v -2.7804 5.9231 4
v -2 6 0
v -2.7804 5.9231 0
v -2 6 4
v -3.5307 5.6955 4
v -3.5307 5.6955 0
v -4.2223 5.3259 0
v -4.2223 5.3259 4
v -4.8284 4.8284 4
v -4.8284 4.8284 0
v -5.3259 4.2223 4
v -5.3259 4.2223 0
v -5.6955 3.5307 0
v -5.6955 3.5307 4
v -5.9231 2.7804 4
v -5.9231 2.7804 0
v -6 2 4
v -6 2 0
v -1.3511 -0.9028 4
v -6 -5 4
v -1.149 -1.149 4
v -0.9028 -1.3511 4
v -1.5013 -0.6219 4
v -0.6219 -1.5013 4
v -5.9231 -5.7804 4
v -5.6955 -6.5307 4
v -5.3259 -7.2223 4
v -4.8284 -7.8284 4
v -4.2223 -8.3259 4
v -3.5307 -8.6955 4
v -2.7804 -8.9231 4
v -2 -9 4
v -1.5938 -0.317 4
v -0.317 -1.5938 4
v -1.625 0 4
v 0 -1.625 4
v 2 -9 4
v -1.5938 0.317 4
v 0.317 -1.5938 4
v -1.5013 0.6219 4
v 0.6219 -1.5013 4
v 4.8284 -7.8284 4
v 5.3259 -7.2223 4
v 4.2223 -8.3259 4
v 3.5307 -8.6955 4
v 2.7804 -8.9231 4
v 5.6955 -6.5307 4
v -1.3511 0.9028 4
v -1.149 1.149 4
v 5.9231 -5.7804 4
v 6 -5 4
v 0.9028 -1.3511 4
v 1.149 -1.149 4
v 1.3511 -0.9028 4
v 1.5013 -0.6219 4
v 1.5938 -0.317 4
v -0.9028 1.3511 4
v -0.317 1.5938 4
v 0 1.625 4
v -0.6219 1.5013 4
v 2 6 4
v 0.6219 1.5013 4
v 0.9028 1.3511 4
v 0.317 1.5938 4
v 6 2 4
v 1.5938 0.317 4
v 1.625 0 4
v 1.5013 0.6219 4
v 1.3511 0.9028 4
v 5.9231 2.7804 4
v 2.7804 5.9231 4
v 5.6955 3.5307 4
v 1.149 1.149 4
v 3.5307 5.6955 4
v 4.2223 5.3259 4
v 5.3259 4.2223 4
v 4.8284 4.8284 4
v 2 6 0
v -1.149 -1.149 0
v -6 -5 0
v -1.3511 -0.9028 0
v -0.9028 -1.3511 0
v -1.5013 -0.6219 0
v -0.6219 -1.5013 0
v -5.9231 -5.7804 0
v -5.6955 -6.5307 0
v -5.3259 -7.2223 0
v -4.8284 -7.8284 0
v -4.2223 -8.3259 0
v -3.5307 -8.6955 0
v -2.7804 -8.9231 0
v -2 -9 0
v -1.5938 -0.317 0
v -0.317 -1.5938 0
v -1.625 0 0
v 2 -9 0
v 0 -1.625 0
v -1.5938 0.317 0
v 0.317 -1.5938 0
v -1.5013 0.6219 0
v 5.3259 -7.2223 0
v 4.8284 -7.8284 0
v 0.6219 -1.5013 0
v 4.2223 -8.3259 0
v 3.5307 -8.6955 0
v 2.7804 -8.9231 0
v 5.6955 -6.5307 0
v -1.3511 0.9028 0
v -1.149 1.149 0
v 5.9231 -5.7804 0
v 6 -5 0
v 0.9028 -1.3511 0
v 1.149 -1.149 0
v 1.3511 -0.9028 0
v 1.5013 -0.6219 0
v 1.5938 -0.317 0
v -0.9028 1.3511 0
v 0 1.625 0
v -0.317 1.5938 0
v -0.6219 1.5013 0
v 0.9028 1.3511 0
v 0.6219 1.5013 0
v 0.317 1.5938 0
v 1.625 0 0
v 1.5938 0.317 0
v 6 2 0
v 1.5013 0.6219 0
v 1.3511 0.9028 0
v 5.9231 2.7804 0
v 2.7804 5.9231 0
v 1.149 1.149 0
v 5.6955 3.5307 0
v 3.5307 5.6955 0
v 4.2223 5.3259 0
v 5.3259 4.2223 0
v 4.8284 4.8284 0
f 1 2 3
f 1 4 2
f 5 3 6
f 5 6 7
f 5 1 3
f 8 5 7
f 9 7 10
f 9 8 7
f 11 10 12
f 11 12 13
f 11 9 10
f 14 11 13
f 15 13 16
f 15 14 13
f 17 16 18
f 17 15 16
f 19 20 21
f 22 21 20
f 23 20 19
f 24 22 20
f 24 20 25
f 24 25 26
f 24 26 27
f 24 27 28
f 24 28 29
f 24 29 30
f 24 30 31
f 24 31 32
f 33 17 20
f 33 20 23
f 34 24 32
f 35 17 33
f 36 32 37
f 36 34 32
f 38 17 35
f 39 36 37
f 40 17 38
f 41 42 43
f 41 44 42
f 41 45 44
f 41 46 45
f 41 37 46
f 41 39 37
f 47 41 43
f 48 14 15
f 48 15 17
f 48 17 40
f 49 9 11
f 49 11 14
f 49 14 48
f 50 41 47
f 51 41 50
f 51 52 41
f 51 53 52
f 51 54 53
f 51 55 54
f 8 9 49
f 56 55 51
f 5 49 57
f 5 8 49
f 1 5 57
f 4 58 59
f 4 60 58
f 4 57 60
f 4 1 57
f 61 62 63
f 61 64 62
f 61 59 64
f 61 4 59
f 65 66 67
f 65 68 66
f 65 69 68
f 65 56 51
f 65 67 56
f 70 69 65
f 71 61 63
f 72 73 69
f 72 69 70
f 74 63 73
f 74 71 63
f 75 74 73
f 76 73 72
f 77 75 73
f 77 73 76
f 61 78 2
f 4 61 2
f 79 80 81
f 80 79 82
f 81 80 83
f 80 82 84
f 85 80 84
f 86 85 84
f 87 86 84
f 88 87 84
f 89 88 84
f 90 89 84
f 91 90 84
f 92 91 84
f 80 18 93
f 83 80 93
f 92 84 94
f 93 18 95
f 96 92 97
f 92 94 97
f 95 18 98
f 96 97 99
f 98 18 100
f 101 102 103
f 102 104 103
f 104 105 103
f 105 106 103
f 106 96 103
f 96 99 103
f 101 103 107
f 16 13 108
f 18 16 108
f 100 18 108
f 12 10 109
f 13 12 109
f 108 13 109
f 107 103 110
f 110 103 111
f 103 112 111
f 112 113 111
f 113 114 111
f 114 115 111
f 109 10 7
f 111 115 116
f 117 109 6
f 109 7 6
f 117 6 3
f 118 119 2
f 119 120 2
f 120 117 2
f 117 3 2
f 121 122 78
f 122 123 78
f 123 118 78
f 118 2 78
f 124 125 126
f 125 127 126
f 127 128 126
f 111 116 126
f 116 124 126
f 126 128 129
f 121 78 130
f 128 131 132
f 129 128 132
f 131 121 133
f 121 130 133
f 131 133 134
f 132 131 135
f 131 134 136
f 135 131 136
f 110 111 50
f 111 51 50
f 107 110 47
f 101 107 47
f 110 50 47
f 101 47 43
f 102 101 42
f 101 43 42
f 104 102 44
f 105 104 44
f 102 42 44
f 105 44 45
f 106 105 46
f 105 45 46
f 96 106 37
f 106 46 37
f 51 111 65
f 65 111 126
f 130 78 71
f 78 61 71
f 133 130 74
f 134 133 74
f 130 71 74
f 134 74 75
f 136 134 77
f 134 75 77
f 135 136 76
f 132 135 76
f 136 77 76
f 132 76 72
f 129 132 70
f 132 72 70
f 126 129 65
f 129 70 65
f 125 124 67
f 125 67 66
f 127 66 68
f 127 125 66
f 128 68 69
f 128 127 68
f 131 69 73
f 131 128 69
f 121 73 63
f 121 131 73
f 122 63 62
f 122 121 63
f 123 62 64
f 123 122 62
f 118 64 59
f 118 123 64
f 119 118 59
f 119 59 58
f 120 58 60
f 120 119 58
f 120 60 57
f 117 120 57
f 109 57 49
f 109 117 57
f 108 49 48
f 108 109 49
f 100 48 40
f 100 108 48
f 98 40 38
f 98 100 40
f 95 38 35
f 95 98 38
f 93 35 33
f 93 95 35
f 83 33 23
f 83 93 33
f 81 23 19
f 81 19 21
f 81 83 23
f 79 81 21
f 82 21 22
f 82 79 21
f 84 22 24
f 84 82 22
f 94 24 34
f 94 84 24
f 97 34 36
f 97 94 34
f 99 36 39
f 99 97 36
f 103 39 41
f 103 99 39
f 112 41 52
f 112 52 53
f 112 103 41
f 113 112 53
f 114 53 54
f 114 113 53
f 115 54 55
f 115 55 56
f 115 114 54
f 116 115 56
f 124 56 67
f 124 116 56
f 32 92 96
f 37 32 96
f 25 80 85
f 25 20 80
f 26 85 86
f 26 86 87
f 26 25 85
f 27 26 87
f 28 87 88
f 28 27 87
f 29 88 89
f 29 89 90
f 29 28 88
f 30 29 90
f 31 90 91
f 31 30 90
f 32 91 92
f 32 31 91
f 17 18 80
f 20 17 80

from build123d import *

# Parameters (mm, degrees)
F0_R     = 1.625
F1_DEPTH = 4
F2_R     = 4


with BuildPart() as f1:
    # F0 (on Top) → F1 (new body)
    with BuildSketch(Plane.XY):
        Polygon((6, -6), (6, 6), (-6, 6), (-6, -6), (-6, -9), (6, -9), align=None)
        Circle(F0_R, mode=Mode.SUBTRACT)
    extrude(amount=F1_DEPTH)

    # F2
    f2_edges = [f1.edges().sort_by_distance(p)[0] for p in [
        (-6, 6, 2),
        (-6, -9, 2),
        (6, -9, 2),
        (6, 6, 2),
    ]]
    fillet(f2_edges, radius=F2_R)


solid = f1.part
